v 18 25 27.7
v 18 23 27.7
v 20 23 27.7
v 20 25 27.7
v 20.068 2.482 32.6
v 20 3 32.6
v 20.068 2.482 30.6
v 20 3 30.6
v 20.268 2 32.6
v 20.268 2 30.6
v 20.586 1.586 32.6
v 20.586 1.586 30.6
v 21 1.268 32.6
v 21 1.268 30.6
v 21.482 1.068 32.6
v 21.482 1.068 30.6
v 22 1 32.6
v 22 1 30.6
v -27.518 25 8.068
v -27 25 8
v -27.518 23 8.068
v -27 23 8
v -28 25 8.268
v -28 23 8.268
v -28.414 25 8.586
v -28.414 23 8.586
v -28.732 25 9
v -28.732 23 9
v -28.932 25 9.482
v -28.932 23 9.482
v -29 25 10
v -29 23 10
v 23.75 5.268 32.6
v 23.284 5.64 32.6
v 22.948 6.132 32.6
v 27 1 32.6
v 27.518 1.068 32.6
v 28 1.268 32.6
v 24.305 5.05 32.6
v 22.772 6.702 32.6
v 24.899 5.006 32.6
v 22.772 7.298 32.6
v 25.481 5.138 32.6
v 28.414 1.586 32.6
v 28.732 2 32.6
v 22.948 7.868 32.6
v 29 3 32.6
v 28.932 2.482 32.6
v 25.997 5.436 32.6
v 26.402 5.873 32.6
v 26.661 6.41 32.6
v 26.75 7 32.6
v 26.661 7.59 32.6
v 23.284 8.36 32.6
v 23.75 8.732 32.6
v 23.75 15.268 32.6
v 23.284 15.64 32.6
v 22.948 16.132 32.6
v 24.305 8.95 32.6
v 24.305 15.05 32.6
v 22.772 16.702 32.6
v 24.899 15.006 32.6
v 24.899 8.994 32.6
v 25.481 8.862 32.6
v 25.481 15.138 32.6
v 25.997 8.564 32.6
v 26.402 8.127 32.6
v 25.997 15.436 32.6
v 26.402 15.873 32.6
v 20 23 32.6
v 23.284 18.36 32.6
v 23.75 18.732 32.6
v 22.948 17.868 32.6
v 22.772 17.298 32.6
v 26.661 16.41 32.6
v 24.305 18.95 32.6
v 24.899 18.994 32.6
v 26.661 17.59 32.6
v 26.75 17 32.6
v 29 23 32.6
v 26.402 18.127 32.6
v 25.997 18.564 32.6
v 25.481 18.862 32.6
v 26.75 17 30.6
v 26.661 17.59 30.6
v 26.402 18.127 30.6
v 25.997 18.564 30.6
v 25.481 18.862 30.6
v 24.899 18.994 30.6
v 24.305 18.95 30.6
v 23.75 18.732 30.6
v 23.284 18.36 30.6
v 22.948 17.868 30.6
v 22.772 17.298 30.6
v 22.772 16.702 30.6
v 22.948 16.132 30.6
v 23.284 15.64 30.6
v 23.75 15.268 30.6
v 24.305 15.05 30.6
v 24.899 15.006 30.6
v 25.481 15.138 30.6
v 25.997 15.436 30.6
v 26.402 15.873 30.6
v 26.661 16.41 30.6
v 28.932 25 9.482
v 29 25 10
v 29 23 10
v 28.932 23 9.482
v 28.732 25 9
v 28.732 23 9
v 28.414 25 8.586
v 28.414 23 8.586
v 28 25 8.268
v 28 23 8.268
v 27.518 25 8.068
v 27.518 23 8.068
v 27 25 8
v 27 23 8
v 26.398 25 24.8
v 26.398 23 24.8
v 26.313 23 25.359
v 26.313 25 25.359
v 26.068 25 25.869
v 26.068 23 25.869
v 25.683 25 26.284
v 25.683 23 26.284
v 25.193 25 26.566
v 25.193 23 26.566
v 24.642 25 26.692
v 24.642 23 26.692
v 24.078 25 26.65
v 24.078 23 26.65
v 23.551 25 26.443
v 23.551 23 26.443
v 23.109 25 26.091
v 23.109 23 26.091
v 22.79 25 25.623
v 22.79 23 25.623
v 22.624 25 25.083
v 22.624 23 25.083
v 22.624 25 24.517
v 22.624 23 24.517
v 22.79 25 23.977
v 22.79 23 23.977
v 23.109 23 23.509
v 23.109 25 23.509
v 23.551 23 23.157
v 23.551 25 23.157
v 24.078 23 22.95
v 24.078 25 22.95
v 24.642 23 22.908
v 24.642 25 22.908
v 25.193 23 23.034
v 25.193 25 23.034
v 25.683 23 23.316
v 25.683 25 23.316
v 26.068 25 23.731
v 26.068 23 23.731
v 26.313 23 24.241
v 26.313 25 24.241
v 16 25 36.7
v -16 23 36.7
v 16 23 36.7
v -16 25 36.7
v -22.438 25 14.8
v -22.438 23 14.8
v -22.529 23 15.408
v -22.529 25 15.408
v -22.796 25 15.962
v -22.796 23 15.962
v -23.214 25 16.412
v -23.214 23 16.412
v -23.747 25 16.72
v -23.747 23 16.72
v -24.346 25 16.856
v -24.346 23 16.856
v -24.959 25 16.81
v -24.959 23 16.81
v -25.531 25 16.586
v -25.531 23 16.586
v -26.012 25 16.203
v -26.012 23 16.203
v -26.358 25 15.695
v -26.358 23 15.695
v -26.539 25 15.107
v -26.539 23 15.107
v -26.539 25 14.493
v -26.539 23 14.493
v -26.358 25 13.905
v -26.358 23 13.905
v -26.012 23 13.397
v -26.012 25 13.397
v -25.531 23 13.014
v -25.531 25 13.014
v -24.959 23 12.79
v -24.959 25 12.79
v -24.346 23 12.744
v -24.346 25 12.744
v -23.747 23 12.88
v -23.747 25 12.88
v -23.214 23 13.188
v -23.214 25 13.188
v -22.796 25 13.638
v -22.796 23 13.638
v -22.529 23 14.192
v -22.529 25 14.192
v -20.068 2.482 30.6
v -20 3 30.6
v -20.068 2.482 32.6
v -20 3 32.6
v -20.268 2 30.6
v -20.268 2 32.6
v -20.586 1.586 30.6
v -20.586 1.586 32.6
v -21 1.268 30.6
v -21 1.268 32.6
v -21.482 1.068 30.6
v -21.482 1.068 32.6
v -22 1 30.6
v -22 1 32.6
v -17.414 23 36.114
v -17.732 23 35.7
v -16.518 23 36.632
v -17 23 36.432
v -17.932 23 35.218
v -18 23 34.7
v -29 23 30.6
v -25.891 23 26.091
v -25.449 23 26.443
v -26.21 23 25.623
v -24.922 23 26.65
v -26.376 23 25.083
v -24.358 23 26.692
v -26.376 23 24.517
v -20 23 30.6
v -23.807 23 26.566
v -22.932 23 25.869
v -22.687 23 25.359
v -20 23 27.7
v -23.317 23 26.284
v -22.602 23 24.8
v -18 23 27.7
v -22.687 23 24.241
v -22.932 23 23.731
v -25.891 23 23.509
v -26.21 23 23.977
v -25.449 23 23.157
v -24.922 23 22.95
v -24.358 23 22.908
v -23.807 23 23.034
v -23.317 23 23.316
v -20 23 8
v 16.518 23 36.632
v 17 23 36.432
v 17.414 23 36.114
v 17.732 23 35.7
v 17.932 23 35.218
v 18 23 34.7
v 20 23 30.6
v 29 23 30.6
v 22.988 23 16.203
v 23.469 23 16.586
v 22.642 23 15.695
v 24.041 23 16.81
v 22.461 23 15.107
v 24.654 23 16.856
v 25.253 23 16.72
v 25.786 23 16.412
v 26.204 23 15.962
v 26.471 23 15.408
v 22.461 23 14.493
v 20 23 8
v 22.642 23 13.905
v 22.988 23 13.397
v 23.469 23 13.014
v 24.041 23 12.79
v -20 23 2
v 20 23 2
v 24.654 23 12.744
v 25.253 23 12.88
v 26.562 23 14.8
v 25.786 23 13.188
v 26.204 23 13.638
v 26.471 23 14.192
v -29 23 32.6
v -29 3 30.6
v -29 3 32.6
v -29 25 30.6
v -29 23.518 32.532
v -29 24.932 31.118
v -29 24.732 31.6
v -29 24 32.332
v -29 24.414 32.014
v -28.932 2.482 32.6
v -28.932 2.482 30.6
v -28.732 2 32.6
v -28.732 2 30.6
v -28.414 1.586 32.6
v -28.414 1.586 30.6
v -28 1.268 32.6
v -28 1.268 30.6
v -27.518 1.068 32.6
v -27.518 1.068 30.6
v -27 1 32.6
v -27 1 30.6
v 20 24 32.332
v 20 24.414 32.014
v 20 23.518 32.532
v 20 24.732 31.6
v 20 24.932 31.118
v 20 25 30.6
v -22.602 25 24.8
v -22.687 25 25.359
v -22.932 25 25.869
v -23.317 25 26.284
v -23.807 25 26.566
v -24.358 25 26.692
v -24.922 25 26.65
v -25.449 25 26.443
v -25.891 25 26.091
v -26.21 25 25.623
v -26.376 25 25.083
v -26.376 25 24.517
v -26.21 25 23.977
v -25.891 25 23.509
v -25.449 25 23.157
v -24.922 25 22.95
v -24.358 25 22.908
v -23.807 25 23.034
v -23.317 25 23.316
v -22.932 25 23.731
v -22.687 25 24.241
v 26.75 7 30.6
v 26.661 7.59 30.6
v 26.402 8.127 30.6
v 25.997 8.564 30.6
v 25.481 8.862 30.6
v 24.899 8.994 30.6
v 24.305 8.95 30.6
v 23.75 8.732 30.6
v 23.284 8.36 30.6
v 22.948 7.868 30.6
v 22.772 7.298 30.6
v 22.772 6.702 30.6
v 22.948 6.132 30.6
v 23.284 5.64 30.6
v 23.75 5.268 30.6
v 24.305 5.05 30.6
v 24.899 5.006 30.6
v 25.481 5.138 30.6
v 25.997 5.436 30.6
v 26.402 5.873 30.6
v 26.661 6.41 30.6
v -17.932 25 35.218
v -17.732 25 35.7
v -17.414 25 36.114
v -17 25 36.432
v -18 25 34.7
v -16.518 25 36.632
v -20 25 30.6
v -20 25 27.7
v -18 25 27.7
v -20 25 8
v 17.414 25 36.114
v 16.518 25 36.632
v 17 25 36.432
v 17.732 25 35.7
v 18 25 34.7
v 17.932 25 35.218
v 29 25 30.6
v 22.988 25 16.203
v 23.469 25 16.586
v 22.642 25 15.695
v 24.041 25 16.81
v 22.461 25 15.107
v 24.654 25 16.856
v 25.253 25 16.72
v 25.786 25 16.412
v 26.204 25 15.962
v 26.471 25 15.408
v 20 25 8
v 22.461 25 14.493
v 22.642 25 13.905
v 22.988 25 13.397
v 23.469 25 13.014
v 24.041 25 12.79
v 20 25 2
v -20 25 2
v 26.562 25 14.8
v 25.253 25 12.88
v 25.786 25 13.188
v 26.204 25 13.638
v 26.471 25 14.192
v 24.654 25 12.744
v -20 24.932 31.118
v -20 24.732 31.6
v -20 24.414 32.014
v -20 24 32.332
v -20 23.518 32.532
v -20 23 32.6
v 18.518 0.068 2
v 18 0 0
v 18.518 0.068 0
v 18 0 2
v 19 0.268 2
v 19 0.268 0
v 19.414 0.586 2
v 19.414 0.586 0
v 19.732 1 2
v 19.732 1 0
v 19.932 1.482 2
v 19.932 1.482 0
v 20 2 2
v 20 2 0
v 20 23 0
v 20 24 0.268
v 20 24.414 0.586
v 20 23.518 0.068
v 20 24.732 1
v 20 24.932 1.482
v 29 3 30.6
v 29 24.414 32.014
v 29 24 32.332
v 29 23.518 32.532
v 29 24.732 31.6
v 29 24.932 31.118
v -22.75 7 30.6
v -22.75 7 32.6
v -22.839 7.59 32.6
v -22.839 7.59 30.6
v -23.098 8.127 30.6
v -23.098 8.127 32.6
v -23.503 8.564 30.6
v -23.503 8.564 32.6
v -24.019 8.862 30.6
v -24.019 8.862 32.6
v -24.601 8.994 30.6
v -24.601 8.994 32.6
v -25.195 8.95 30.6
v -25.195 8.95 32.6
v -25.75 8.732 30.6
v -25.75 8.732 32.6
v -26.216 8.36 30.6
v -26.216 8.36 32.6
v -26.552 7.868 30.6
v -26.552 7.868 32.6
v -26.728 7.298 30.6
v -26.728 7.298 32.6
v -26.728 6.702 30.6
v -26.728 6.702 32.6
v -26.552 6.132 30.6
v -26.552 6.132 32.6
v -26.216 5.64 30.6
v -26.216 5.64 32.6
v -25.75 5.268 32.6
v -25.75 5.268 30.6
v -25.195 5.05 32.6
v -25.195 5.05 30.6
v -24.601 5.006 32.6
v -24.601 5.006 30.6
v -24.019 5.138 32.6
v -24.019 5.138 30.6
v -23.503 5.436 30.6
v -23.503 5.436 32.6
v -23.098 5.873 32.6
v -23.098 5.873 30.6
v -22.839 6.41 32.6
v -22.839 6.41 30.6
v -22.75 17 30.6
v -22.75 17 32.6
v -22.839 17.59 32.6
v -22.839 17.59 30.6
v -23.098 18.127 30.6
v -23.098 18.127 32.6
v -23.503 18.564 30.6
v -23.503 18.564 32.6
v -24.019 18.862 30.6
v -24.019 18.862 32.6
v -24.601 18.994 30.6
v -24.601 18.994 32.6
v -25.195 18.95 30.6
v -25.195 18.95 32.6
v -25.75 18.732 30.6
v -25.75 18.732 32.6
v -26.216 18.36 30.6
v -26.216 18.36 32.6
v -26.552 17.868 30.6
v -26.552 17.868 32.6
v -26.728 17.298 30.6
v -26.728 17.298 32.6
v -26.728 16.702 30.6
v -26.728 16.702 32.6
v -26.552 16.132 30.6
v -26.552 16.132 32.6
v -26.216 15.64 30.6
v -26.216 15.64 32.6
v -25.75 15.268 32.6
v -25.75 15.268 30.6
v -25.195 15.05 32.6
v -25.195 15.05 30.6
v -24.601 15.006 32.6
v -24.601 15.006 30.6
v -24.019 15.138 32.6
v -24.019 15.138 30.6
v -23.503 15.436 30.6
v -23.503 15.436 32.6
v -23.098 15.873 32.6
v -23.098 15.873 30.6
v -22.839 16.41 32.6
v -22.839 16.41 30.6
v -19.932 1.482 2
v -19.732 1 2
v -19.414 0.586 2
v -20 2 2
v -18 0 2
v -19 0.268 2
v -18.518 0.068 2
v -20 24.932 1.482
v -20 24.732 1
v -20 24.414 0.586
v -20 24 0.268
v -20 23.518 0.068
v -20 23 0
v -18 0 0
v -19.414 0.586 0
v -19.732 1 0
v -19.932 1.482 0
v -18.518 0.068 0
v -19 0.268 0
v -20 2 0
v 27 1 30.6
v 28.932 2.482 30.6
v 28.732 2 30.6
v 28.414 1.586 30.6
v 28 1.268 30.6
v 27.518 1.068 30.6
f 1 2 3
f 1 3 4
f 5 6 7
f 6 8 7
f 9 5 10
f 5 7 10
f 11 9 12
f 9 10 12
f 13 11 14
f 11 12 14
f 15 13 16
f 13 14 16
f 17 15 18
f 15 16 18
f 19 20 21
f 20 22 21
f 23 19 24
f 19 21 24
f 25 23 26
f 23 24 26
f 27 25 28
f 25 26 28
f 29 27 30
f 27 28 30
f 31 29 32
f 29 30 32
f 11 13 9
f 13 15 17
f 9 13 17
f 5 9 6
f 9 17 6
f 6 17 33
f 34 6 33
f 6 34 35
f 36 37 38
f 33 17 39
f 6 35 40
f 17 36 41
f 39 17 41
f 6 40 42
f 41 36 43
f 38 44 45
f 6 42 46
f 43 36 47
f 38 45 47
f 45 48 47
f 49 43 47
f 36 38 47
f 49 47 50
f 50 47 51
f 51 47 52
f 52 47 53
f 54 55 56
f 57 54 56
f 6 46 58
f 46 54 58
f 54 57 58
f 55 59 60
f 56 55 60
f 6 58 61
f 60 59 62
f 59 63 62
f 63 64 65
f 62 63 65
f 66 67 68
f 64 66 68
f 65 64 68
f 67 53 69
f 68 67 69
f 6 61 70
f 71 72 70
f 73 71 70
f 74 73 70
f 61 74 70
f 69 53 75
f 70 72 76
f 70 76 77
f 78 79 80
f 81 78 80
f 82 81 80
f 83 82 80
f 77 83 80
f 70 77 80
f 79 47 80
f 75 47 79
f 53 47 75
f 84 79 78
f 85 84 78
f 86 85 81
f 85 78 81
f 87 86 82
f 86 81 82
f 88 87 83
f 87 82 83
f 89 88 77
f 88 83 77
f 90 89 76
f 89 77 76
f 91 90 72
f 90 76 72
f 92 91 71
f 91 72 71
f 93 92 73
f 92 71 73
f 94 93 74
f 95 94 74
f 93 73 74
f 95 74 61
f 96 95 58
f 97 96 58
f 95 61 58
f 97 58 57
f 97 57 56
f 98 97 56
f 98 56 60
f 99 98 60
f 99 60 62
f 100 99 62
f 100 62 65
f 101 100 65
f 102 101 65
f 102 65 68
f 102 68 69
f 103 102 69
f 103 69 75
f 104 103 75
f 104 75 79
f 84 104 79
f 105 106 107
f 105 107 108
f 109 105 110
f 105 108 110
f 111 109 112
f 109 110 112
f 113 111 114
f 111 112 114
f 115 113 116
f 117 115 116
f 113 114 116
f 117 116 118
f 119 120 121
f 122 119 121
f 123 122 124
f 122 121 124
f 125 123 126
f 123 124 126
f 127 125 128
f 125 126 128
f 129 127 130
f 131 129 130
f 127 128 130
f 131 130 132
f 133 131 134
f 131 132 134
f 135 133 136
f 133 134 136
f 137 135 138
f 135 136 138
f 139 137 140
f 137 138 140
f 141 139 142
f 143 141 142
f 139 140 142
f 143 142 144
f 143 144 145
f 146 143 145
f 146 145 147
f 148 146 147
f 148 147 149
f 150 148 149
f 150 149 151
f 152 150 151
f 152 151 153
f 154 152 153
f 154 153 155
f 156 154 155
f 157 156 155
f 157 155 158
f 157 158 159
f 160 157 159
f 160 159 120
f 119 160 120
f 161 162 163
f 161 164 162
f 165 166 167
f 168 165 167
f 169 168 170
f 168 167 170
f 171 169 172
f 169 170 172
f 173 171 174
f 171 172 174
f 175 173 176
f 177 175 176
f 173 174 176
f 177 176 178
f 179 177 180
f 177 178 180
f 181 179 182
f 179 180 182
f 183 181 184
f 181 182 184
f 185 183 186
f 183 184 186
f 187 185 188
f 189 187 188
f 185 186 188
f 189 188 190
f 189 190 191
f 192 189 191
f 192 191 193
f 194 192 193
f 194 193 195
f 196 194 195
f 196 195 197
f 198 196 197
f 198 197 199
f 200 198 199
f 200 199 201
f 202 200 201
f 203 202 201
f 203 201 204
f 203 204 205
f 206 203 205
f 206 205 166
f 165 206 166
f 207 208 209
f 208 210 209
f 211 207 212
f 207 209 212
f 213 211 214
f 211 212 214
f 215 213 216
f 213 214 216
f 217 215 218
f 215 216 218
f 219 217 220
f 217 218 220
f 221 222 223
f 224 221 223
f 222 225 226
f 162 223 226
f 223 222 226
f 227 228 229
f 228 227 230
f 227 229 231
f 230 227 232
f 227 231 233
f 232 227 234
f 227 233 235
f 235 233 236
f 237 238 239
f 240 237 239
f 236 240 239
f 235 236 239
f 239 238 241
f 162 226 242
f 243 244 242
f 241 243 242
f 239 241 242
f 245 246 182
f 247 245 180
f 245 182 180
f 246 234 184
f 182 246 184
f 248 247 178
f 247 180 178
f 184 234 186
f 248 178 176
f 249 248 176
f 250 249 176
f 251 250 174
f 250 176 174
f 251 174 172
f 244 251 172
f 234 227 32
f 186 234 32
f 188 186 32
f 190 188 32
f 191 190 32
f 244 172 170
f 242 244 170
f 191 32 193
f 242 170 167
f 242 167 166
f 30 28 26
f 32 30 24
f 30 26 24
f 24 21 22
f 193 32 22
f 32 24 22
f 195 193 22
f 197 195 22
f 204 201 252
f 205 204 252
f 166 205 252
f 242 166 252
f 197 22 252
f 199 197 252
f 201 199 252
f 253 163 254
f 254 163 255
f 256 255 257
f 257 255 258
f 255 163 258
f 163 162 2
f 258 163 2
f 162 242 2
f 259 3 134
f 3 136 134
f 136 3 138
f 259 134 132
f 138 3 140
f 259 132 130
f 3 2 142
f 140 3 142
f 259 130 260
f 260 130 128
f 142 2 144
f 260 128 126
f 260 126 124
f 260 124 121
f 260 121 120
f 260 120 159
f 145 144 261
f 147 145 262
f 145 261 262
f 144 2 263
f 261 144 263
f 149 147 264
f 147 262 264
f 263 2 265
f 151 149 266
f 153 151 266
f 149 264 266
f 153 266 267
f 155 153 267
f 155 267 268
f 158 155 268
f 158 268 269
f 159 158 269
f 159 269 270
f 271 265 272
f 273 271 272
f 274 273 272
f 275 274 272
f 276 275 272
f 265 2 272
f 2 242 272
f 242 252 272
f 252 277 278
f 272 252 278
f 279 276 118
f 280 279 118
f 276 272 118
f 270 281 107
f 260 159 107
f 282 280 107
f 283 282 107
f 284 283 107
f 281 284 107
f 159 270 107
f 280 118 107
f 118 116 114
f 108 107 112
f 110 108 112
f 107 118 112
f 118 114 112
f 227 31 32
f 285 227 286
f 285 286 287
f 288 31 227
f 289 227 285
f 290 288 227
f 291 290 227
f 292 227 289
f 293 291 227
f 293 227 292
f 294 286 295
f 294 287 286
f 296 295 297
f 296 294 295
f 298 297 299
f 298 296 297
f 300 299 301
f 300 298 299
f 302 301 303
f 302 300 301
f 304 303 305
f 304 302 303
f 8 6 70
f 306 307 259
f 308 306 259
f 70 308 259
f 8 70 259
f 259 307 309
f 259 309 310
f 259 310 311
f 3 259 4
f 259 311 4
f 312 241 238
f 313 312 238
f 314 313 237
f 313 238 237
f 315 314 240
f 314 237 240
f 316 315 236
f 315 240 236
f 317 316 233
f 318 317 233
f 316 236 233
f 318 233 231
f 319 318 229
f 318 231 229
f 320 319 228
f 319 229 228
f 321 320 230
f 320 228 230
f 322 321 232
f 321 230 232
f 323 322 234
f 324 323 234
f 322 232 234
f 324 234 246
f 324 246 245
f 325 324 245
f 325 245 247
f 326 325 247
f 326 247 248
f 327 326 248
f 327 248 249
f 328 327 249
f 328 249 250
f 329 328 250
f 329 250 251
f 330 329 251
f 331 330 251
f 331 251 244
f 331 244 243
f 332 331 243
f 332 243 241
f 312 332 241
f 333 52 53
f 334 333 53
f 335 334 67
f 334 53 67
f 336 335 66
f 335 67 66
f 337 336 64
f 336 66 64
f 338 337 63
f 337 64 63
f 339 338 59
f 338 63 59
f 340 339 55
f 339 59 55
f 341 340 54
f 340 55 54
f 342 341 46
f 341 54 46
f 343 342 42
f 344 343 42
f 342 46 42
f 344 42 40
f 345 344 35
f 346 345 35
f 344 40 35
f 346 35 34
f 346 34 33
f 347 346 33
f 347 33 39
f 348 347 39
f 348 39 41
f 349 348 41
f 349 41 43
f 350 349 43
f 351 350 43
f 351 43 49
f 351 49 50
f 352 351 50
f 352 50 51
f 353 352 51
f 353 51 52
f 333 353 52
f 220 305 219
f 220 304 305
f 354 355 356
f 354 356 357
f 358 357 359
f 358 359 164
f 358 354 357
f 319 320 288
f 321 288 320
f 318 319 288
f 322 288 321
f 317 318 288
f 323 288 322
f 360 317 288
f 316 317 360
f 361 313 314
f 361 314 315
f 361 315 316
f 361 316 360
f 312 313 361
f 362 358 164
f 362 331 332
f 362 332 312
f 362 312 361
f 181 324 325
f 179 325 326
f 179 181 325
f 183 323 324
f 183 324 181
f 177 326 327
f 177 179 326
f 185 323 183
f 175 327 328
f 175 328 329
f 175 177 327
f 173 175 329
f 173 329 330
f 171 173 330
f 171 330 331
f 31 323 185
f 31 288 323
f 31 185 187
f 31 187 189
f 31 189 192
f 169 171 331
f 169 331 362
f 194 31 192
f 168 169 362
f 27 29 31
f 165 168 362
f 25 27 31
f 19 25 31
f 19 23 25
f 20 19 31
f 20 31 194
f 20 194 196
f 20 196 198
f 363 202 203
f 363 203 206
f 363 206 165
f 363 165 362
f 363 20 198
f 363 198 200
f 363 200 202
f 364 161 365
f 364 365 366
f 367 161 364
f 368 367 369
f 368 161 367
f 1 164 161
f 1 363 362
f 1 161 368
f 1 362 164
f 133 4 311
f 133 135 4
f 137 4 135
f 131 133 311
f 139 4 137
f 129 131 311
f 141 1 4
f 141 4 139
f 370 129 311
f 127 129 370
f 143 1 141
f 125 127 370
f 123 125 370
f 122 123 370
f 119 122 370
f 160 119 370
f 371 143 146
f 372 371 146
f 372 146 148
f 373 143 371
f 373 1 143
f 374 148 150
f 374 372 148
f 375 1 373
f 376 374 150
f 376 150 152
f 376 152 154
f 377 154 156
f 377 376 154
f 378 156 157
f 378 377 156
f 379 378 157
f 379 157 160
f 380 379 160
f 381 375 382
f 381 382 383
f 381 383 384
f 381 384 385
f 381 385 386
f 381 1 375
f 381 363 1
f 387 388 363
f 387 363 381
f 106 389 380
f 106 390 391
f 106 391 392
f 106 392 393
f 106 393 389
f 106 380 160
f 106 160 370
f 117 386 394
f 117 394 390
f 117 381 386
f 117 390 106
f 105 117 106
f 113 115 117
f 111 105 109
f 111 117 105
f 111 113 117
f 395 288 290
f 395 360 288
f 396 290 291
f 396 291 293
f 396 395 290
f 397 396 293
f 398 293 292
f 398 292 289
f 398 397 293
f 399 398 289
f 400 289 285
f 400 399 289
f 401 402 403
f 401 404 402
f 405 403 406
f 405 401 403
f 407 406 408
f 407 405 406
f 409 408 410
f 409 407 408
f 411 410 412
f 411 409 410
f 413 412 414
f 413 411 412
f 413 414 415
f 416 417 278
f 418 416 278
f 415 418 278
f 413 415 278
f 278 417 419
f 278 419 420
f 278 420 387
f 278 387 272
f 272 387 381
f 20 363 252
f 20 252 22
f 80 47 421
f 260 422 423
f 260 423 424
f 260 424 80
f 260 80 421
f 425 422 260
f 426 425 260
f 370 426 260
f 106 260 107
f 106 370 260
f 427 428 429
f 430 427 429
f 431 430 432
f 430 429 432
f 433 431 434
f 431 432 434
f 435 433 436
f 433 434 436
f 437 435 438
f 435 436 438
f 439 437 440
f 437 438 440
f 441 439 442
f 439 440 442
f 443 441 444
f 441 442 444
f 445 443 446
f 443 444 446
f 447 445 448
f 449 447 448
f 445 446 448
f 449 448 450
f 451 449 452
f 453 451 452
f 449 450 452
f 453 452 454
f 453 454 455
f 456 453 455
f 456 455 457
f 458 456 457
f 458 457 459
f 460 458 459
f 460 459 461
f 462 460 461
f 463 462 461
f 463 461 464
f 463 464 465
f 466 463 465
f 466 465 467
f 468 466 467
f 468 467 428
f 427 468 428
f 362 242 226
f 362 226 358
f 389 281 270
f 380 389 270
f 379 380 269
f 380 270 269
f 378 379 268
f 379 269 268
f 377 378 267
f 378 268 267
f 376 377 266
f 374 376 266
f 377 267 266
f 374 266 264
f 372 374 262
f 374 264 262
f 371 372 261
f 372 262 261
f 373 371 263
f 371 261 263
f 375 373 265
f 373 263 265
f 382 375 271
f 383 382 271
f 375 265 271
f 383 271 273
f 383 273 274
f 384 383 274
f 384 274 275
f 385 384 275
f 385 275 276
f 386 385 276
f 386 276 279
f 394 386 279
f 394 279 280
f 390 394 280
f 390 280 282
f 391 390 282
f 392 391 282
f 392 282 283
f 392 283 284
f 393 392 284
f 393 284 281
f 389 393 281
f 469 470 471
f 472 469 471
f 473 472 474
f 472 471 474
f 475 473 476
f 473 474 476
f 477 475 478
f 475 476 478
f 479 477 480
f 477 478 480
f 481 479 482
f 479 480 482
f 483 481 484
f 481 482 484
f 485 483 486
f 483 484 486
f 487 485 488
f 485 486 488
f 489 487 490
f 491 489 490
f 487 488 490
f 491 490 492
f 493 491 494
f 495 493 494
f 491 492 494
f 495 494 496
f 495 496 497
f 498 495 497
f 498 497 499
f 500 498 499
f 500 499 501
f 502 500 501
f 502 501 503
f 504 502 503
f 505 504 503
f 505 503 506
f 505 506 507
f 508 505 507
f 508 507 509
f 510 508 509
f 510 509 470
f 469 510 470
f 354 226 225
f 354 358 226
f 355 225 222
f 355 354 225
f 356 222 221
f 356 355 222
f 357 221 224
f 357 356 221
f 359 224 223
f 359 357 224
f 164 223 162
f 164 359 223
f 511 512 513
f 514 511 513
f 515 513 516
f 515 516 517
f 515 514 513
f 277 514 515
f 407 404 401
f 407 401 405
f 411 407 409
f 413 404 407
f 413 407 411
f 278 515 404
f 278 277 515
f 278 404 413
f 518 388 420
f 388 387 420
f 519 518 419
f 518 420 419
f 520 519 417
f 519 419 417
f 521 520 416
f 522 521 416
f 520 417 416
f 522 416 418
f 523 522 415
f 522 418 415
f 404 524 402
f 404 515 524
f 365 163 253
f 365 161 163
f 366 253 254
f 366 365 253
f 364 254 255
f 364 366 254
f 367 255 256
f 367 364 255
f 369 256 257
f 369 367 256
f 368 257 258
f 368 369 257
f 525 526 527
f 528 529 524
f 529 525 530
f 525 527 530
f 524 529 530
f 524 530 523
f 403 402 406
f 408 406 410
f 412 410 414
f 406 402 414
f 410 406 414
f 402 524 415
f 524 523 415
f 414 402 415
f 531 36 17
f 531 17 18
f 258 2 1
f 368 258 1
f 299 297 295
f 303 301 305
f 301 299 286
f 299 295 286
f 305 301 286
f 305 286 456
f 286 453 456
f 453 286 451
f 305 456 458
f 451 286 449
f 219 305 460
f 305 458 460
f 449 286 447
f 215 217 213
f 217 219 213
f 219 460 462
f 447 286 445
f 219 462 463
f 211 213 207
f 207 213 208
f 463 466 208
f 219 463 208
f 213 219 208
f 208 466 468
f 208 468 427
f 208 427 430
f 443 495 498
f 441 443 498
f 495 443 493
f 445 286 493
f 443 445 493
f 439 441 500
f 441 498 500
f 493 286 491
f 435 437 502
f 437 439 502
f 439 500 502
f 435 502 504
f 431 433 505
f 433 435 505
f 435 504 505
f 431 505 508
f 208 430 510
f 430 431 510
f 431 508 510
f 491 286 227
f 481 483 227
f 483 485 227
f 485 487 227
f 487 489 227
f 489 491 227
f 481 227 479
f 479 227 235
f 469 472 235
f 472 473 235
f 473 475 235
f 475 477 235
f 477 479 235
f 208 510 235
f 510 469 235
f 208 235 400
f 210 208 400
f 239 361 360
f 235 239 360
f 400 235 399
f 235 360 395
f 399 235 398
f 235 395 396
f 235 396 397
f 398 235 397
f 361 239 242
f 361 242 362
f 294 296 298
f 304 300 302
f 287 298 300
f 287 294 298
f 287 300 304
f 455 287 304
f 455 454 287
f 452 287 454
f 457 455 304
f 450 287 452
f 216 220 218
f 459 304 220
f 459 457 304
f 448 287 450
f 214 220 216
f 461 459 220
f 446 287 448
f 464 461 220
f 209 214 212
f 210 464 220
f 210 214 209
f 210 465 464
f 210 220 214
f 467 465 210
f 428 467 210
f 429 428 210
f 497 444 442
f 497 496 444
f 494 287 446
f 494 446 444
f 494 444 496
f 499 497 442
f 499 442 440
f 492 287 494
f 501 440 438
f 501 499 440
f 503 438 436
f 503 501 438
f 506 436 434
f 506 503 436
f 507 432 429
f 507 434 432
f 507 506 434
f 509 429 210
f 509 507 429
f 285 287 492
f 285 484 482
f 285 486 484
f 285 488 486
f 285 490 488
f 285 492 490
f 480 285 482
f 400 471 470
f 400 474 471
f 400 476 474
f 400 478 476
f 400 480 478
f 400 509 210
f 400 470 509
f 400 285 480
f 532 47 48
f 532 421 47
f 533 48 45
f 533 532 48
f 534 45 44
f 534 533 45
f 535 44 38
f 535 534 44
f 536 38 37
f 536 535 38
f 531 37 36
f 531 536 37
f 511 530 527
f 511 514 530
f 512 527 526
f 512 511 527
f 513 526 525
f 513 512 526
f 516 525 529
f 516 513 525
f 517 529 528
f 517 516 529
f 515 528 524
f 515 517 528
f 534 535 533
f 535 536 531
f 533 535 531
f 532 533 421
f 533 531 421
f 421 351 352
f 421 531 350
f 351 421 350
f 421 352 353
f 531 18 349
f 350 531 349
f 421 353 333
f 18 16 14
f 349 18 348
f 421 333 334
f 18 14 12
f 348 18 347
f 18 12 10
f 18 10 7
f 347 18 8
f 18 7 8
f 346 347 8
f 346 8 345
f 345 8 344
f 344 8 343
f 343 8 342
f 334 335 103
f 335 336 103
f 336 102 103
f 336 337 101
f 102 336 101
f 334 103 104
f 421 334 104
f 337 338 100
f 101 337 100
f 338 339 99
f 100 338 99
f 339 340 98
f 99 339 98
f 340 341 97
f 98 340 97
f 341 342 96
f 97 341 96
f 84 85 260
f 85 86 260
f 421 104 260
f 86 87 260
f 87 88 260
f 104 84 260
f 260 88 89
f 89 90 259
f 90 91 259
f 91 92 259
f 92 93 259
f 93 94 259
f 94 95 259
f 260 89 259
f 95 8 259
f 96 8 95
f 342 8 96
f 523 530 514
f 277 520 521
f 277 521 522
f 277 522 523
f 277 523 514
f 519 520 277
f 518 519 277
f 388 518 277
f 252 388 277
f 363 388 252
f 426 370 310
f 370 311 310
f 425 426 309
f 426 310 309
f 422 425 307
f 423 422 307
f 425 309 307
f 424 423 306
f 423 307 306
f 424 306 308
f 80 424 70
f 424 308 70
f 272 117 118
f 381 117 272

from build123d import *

# Parameters (mm, degrees)
SKETCH_1_W            = 32.6
SKETCH_1_H            = 23.999999657
EXTRUDE_1_DEPTH       = 8.999999702
SKETCH_2_W            = 30.6
SKETCH_2_H            = 22
CUT_EXTRUDE_1_DEPTH   = 9.999999702
SKETCH_3_W            = 27.7
SKETCH_3_H            = 1.999999657
EXTRUDE_2_DEPTH       = 49.000000298
SKETCH_4_W            = 8.999999702
SKETCH_4_H            = 1.999999657
EXTRUDE_3_DEPTH       = 4.9
SKETCH_5_W            = 8.999999702
SKETCH_5_H            = 2
EXTRUDE_4_DEPTH       = 22
SKETCH_6_W            = 9
SKETCH_6_H            = 8
CUT_EXTRUDE_2_DEPTH   = 24.999999657
SKETCH_7_W            = 9
SKETCH_7_H            = 8
CUT_EXTRUDE_3_DEPTH   = 24.999999657
SKETCH_8_W            = 40
SKETCH_8_H            = 2
EXTRUDE_5_DEPTH       = 23.000000343
SKETCH_9_W            = 36.000000596
SKETCH_9_H            = 1.999999657
EXTRUDE_6_DEPTH       = 9
HOLE_WIZARD_4_0_4_1_D = 4
FILLET_1_R            = 2
SKETCH_12_R           = 1.897672249
SKETCH_12_R_2         = 2.0621459
CUT_EXTRUDE_4_DEPTH   = 2.999999657


with BuildPart() as part:
    # 草图1 → 凸台-拉伸1 (new body)
    with BuildSketch(Plane(origin=(29, 0, 0), x_dir=(0, 0, -1), z_dir=(1, 0, 0))):
        with Locations((-16.3, 13.000000171)):
            Rectangle(SKETCH_1_W, SKETCH_1_H)
    extrude(amount=-EXTRUDE_1_DEPTH)

    # 草图2 → 切除-拉伸1 (cut, through all)
    with BuildSketch(Plane.ZY.offset(-20.000000298)):
        with Locations((15.3, 12.000000343)):
            Rectangle(SKETCH_2_W, SKETCH_2_H)
    extrude(amount=-CUT_EXTRUDE_1_DEPTH, mode=Mode.SUBTRACT)

    # 草图3 → 凸台-拉伸2 (add)
    with BuildSketch(Plane.ZY.offset(-20.000000298)):
        with Locations((13.85, 24.000000171)):
            Rectangle(SKETCH_3_W, SKETCH_3_H)
    extrude(amount=EXTRUDE_2_DEPTH)

    # 草图4 → 凸台-拉伸3 (add)
    with BuildSketch(Plane.XY.offset(27.7)):
        with Locations((-24.500000149, 24.000000171)):
            Rectangle(SKETCH_4_W, SKETCH_4_H)
    extrude(amount=EXTRUDE_3_DEPTH)

    # 草图5 → 凸台-拉伸4 (add)
    with BuildSketch(Plane.XZ.offset(-23.000000343)):
        with Locations((-24.500000149, 31.6)):
            Rectangle(SKETCH_5_W, SKETCH_5_H)
    extrude(amount=EXTRUDE_4_DEPTH)

    # 草图6 → 切除-拉伸2 (cut, through all)
    with BuildSketch(Plane(origin=(0, 25, 0), x_dir=(-1, 0, 0), z_dir=(0, 1, 0))):
        with Locations((24.5, 4)):
            Rectangle(SKETCH_6_W, SKETCH_6_H)
    extrude(amount=-CUT_EXTRUDE_2_DEPTH, mode=Mode.SUBTRACT)

    # 草图7 → 切除-拉伸3 (cut, through all)
    with BuildSketch(Plane(origin=(0, 25, 0), x_dir=(-1, 0, 0), z_dir=(0, 1, 0))):
        with Locations((-24.5, 4)):
            Rectangle(SKETCH_7_W, SKETCH_7_H)
    extrude(amount=-CUT_EXTRUDE_3_DEPTH, mode=Mode.SUBTRACT)

    # 草图8 → 凸台-拉伸5 (add)
    with BuildSketch(Plane.XZ.offset(-23.000000343)):
        with Locations((0, 1)):
            Rectangle(SKETCH_8_W, SKETCH_8_H)
    extrude(amount=EXTRUDE_5_DEPTH)

    # 草图9 → 凸台-拉伸6 (add)
    with BuildSketch(Plane.XY.offset(27.7)):
        with Locations((0, 24.000000171)):
            Rectangle(SKETCH_9_W, SKETCH_9_H)
    extrude(amount=EXTRUDE_6_DEPTH)

    # Ø4.0 (4) 直径孔1 (through all)
    with Locations(Plane(origin=(0, 0, 30.6), x_dir=(-1, 0, 0), z_dir=(0, 0, -1))):
        with Locations((-24.75, 17.000000343), (-24.75, 7.000000343), (24.75, 17.000000343), (24.75, 7.000000343)):
            Hole(HOLE_WIZARD_4_0_4_1_D / 2)

    # 圆角1
    fillet_1_edges = [part.edges().sort_by_distance(p)[0] for p in [
        (-20, 0, 1),
        (20, 0, 1),
        (-18.000000298, 24.000000171, 36.7),
        (18.000000298, 24.000000171, 36.7),
        (-24.500000149, 25, 32.6),
        (-20.000000298, 1.000000343, 31.6),
        (-29, 1.000000343, 31.6),
        (29, 1.000000343, 31.6),
        (-29, 24.000000171, 8),
        (0, 25, 0),
        (24.500000149, 25, 32.6),
        (20.000000298, 1.000000343, 31.6),
        (29, 24.000000171, 8),
    ]]
    fillet(fillet_1_edges, radius=FILLET_1_R)

    # 草图12 → 切除-拉伸4 (cut, through all)
    with BuildSketch(Plane.XZ.offset(-23.000000343)):
        with Locations((-24.500000149, 24.8)):
            Circle(SKETCH_12_R)
        with Locations((-24.500000149, 14.8)):
            Circle(SKETCH_12_R_2)
        with Locations((24.500000149, 14.8)):
            Circle(SKETCH_12_R_2)
        with Locations((24.500000149, 24.8)):
            Circle(SKETCH_12_R)
    extrude(amount=-CUT_EXTRUDE_4_DEPTH, mode=Mode.SUBTRACT)


solid = part.part
